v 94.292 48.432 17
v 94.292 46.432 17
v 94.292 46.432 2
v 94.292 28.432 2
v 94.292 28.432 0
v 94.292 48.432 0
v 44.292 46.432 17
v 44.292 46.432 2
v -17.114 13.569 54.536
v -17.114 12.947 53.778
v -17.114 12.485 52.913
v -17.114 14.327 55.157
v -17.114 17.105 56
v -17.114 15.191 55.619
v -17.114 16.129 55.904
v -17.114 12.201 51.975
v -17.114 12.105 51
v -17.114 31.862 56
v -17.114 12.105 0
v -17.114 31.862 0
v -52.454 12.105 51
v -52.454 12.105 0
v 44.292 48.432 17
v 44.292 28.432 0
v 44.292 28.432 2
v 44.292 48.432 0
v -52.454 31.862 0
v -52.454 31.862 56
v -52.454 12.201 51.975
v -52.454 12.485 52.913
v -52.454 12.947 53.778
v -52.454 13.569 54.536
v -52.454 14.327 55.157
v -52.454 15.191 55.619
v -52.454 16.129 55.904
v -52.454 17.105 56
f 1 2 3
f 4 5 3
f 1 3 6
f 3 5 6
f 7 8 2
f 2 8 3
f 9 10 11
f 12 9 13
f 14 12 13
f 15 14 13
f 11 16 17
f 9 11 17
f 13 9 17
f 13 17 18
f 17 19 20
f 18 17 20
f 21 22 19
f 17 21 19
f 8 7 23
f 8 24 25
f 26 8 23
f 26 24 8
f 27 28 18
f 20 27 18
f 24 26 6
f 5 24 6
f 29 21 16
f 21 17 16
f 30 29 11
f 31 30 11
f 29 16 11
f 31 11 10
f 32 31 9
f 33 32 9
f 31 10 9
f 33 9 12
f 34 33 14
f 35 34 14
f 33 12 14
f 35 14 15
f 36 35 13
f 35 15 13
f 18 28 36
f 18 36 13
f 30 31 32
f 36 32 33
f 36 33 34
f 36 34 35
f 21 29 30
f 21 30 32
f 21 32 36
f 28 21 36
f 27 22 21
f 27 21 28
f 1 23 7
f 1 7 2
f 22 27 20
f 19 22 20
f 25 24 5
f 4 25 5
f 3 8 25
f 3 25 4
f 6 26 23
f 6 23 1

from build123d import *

# Parameters (mm, degrees)
F0_W     = 35.340104
F0_H     = 19.757069
F1_DEPTH = 56
F2_R     = 5
F3_W     = 50
F3_H     = 20
F4_DEPTH = 2
F5_W     = 50
F5_H     = 2
F6_DEPTH = 15


with BuildPart() as f1:
    # F0 (on Top) → F1 (new body)
    with BuildSketch(Plane.XY):
        with Locations((-34.78357, 21.983217)):
            Rectangle(F0_W, F0_H)
    extrude(amount=F1_DEPTH)

    # F2
    f2_edges = [f1.edges().sort_by_distance(p)[0] for p in [
        (-34.78357, 12.104683, 56),
    ]]
    fillet(f2_edges, radius=F2_R)


with BuildPart() as f4:
    # F3 (on Top) → F4 (new body)
    with BuildSketch(Plane.XY):
        with Locations((69.292186, 38.43203)):
            Rectangle(F3_W, F3_H)
    extrude(amount=F4_DEPTH)

    # F5 (on face) → F6 (join)
    with BuildSketch(Plane.XY.offset(2)):
        with Locations((69.292186, 47.43203)):
            Rectangle(F5_W, F5_H)
    extrude(amount=F6_DEPTH)


solid = Compound([f1.part, f4.part])
